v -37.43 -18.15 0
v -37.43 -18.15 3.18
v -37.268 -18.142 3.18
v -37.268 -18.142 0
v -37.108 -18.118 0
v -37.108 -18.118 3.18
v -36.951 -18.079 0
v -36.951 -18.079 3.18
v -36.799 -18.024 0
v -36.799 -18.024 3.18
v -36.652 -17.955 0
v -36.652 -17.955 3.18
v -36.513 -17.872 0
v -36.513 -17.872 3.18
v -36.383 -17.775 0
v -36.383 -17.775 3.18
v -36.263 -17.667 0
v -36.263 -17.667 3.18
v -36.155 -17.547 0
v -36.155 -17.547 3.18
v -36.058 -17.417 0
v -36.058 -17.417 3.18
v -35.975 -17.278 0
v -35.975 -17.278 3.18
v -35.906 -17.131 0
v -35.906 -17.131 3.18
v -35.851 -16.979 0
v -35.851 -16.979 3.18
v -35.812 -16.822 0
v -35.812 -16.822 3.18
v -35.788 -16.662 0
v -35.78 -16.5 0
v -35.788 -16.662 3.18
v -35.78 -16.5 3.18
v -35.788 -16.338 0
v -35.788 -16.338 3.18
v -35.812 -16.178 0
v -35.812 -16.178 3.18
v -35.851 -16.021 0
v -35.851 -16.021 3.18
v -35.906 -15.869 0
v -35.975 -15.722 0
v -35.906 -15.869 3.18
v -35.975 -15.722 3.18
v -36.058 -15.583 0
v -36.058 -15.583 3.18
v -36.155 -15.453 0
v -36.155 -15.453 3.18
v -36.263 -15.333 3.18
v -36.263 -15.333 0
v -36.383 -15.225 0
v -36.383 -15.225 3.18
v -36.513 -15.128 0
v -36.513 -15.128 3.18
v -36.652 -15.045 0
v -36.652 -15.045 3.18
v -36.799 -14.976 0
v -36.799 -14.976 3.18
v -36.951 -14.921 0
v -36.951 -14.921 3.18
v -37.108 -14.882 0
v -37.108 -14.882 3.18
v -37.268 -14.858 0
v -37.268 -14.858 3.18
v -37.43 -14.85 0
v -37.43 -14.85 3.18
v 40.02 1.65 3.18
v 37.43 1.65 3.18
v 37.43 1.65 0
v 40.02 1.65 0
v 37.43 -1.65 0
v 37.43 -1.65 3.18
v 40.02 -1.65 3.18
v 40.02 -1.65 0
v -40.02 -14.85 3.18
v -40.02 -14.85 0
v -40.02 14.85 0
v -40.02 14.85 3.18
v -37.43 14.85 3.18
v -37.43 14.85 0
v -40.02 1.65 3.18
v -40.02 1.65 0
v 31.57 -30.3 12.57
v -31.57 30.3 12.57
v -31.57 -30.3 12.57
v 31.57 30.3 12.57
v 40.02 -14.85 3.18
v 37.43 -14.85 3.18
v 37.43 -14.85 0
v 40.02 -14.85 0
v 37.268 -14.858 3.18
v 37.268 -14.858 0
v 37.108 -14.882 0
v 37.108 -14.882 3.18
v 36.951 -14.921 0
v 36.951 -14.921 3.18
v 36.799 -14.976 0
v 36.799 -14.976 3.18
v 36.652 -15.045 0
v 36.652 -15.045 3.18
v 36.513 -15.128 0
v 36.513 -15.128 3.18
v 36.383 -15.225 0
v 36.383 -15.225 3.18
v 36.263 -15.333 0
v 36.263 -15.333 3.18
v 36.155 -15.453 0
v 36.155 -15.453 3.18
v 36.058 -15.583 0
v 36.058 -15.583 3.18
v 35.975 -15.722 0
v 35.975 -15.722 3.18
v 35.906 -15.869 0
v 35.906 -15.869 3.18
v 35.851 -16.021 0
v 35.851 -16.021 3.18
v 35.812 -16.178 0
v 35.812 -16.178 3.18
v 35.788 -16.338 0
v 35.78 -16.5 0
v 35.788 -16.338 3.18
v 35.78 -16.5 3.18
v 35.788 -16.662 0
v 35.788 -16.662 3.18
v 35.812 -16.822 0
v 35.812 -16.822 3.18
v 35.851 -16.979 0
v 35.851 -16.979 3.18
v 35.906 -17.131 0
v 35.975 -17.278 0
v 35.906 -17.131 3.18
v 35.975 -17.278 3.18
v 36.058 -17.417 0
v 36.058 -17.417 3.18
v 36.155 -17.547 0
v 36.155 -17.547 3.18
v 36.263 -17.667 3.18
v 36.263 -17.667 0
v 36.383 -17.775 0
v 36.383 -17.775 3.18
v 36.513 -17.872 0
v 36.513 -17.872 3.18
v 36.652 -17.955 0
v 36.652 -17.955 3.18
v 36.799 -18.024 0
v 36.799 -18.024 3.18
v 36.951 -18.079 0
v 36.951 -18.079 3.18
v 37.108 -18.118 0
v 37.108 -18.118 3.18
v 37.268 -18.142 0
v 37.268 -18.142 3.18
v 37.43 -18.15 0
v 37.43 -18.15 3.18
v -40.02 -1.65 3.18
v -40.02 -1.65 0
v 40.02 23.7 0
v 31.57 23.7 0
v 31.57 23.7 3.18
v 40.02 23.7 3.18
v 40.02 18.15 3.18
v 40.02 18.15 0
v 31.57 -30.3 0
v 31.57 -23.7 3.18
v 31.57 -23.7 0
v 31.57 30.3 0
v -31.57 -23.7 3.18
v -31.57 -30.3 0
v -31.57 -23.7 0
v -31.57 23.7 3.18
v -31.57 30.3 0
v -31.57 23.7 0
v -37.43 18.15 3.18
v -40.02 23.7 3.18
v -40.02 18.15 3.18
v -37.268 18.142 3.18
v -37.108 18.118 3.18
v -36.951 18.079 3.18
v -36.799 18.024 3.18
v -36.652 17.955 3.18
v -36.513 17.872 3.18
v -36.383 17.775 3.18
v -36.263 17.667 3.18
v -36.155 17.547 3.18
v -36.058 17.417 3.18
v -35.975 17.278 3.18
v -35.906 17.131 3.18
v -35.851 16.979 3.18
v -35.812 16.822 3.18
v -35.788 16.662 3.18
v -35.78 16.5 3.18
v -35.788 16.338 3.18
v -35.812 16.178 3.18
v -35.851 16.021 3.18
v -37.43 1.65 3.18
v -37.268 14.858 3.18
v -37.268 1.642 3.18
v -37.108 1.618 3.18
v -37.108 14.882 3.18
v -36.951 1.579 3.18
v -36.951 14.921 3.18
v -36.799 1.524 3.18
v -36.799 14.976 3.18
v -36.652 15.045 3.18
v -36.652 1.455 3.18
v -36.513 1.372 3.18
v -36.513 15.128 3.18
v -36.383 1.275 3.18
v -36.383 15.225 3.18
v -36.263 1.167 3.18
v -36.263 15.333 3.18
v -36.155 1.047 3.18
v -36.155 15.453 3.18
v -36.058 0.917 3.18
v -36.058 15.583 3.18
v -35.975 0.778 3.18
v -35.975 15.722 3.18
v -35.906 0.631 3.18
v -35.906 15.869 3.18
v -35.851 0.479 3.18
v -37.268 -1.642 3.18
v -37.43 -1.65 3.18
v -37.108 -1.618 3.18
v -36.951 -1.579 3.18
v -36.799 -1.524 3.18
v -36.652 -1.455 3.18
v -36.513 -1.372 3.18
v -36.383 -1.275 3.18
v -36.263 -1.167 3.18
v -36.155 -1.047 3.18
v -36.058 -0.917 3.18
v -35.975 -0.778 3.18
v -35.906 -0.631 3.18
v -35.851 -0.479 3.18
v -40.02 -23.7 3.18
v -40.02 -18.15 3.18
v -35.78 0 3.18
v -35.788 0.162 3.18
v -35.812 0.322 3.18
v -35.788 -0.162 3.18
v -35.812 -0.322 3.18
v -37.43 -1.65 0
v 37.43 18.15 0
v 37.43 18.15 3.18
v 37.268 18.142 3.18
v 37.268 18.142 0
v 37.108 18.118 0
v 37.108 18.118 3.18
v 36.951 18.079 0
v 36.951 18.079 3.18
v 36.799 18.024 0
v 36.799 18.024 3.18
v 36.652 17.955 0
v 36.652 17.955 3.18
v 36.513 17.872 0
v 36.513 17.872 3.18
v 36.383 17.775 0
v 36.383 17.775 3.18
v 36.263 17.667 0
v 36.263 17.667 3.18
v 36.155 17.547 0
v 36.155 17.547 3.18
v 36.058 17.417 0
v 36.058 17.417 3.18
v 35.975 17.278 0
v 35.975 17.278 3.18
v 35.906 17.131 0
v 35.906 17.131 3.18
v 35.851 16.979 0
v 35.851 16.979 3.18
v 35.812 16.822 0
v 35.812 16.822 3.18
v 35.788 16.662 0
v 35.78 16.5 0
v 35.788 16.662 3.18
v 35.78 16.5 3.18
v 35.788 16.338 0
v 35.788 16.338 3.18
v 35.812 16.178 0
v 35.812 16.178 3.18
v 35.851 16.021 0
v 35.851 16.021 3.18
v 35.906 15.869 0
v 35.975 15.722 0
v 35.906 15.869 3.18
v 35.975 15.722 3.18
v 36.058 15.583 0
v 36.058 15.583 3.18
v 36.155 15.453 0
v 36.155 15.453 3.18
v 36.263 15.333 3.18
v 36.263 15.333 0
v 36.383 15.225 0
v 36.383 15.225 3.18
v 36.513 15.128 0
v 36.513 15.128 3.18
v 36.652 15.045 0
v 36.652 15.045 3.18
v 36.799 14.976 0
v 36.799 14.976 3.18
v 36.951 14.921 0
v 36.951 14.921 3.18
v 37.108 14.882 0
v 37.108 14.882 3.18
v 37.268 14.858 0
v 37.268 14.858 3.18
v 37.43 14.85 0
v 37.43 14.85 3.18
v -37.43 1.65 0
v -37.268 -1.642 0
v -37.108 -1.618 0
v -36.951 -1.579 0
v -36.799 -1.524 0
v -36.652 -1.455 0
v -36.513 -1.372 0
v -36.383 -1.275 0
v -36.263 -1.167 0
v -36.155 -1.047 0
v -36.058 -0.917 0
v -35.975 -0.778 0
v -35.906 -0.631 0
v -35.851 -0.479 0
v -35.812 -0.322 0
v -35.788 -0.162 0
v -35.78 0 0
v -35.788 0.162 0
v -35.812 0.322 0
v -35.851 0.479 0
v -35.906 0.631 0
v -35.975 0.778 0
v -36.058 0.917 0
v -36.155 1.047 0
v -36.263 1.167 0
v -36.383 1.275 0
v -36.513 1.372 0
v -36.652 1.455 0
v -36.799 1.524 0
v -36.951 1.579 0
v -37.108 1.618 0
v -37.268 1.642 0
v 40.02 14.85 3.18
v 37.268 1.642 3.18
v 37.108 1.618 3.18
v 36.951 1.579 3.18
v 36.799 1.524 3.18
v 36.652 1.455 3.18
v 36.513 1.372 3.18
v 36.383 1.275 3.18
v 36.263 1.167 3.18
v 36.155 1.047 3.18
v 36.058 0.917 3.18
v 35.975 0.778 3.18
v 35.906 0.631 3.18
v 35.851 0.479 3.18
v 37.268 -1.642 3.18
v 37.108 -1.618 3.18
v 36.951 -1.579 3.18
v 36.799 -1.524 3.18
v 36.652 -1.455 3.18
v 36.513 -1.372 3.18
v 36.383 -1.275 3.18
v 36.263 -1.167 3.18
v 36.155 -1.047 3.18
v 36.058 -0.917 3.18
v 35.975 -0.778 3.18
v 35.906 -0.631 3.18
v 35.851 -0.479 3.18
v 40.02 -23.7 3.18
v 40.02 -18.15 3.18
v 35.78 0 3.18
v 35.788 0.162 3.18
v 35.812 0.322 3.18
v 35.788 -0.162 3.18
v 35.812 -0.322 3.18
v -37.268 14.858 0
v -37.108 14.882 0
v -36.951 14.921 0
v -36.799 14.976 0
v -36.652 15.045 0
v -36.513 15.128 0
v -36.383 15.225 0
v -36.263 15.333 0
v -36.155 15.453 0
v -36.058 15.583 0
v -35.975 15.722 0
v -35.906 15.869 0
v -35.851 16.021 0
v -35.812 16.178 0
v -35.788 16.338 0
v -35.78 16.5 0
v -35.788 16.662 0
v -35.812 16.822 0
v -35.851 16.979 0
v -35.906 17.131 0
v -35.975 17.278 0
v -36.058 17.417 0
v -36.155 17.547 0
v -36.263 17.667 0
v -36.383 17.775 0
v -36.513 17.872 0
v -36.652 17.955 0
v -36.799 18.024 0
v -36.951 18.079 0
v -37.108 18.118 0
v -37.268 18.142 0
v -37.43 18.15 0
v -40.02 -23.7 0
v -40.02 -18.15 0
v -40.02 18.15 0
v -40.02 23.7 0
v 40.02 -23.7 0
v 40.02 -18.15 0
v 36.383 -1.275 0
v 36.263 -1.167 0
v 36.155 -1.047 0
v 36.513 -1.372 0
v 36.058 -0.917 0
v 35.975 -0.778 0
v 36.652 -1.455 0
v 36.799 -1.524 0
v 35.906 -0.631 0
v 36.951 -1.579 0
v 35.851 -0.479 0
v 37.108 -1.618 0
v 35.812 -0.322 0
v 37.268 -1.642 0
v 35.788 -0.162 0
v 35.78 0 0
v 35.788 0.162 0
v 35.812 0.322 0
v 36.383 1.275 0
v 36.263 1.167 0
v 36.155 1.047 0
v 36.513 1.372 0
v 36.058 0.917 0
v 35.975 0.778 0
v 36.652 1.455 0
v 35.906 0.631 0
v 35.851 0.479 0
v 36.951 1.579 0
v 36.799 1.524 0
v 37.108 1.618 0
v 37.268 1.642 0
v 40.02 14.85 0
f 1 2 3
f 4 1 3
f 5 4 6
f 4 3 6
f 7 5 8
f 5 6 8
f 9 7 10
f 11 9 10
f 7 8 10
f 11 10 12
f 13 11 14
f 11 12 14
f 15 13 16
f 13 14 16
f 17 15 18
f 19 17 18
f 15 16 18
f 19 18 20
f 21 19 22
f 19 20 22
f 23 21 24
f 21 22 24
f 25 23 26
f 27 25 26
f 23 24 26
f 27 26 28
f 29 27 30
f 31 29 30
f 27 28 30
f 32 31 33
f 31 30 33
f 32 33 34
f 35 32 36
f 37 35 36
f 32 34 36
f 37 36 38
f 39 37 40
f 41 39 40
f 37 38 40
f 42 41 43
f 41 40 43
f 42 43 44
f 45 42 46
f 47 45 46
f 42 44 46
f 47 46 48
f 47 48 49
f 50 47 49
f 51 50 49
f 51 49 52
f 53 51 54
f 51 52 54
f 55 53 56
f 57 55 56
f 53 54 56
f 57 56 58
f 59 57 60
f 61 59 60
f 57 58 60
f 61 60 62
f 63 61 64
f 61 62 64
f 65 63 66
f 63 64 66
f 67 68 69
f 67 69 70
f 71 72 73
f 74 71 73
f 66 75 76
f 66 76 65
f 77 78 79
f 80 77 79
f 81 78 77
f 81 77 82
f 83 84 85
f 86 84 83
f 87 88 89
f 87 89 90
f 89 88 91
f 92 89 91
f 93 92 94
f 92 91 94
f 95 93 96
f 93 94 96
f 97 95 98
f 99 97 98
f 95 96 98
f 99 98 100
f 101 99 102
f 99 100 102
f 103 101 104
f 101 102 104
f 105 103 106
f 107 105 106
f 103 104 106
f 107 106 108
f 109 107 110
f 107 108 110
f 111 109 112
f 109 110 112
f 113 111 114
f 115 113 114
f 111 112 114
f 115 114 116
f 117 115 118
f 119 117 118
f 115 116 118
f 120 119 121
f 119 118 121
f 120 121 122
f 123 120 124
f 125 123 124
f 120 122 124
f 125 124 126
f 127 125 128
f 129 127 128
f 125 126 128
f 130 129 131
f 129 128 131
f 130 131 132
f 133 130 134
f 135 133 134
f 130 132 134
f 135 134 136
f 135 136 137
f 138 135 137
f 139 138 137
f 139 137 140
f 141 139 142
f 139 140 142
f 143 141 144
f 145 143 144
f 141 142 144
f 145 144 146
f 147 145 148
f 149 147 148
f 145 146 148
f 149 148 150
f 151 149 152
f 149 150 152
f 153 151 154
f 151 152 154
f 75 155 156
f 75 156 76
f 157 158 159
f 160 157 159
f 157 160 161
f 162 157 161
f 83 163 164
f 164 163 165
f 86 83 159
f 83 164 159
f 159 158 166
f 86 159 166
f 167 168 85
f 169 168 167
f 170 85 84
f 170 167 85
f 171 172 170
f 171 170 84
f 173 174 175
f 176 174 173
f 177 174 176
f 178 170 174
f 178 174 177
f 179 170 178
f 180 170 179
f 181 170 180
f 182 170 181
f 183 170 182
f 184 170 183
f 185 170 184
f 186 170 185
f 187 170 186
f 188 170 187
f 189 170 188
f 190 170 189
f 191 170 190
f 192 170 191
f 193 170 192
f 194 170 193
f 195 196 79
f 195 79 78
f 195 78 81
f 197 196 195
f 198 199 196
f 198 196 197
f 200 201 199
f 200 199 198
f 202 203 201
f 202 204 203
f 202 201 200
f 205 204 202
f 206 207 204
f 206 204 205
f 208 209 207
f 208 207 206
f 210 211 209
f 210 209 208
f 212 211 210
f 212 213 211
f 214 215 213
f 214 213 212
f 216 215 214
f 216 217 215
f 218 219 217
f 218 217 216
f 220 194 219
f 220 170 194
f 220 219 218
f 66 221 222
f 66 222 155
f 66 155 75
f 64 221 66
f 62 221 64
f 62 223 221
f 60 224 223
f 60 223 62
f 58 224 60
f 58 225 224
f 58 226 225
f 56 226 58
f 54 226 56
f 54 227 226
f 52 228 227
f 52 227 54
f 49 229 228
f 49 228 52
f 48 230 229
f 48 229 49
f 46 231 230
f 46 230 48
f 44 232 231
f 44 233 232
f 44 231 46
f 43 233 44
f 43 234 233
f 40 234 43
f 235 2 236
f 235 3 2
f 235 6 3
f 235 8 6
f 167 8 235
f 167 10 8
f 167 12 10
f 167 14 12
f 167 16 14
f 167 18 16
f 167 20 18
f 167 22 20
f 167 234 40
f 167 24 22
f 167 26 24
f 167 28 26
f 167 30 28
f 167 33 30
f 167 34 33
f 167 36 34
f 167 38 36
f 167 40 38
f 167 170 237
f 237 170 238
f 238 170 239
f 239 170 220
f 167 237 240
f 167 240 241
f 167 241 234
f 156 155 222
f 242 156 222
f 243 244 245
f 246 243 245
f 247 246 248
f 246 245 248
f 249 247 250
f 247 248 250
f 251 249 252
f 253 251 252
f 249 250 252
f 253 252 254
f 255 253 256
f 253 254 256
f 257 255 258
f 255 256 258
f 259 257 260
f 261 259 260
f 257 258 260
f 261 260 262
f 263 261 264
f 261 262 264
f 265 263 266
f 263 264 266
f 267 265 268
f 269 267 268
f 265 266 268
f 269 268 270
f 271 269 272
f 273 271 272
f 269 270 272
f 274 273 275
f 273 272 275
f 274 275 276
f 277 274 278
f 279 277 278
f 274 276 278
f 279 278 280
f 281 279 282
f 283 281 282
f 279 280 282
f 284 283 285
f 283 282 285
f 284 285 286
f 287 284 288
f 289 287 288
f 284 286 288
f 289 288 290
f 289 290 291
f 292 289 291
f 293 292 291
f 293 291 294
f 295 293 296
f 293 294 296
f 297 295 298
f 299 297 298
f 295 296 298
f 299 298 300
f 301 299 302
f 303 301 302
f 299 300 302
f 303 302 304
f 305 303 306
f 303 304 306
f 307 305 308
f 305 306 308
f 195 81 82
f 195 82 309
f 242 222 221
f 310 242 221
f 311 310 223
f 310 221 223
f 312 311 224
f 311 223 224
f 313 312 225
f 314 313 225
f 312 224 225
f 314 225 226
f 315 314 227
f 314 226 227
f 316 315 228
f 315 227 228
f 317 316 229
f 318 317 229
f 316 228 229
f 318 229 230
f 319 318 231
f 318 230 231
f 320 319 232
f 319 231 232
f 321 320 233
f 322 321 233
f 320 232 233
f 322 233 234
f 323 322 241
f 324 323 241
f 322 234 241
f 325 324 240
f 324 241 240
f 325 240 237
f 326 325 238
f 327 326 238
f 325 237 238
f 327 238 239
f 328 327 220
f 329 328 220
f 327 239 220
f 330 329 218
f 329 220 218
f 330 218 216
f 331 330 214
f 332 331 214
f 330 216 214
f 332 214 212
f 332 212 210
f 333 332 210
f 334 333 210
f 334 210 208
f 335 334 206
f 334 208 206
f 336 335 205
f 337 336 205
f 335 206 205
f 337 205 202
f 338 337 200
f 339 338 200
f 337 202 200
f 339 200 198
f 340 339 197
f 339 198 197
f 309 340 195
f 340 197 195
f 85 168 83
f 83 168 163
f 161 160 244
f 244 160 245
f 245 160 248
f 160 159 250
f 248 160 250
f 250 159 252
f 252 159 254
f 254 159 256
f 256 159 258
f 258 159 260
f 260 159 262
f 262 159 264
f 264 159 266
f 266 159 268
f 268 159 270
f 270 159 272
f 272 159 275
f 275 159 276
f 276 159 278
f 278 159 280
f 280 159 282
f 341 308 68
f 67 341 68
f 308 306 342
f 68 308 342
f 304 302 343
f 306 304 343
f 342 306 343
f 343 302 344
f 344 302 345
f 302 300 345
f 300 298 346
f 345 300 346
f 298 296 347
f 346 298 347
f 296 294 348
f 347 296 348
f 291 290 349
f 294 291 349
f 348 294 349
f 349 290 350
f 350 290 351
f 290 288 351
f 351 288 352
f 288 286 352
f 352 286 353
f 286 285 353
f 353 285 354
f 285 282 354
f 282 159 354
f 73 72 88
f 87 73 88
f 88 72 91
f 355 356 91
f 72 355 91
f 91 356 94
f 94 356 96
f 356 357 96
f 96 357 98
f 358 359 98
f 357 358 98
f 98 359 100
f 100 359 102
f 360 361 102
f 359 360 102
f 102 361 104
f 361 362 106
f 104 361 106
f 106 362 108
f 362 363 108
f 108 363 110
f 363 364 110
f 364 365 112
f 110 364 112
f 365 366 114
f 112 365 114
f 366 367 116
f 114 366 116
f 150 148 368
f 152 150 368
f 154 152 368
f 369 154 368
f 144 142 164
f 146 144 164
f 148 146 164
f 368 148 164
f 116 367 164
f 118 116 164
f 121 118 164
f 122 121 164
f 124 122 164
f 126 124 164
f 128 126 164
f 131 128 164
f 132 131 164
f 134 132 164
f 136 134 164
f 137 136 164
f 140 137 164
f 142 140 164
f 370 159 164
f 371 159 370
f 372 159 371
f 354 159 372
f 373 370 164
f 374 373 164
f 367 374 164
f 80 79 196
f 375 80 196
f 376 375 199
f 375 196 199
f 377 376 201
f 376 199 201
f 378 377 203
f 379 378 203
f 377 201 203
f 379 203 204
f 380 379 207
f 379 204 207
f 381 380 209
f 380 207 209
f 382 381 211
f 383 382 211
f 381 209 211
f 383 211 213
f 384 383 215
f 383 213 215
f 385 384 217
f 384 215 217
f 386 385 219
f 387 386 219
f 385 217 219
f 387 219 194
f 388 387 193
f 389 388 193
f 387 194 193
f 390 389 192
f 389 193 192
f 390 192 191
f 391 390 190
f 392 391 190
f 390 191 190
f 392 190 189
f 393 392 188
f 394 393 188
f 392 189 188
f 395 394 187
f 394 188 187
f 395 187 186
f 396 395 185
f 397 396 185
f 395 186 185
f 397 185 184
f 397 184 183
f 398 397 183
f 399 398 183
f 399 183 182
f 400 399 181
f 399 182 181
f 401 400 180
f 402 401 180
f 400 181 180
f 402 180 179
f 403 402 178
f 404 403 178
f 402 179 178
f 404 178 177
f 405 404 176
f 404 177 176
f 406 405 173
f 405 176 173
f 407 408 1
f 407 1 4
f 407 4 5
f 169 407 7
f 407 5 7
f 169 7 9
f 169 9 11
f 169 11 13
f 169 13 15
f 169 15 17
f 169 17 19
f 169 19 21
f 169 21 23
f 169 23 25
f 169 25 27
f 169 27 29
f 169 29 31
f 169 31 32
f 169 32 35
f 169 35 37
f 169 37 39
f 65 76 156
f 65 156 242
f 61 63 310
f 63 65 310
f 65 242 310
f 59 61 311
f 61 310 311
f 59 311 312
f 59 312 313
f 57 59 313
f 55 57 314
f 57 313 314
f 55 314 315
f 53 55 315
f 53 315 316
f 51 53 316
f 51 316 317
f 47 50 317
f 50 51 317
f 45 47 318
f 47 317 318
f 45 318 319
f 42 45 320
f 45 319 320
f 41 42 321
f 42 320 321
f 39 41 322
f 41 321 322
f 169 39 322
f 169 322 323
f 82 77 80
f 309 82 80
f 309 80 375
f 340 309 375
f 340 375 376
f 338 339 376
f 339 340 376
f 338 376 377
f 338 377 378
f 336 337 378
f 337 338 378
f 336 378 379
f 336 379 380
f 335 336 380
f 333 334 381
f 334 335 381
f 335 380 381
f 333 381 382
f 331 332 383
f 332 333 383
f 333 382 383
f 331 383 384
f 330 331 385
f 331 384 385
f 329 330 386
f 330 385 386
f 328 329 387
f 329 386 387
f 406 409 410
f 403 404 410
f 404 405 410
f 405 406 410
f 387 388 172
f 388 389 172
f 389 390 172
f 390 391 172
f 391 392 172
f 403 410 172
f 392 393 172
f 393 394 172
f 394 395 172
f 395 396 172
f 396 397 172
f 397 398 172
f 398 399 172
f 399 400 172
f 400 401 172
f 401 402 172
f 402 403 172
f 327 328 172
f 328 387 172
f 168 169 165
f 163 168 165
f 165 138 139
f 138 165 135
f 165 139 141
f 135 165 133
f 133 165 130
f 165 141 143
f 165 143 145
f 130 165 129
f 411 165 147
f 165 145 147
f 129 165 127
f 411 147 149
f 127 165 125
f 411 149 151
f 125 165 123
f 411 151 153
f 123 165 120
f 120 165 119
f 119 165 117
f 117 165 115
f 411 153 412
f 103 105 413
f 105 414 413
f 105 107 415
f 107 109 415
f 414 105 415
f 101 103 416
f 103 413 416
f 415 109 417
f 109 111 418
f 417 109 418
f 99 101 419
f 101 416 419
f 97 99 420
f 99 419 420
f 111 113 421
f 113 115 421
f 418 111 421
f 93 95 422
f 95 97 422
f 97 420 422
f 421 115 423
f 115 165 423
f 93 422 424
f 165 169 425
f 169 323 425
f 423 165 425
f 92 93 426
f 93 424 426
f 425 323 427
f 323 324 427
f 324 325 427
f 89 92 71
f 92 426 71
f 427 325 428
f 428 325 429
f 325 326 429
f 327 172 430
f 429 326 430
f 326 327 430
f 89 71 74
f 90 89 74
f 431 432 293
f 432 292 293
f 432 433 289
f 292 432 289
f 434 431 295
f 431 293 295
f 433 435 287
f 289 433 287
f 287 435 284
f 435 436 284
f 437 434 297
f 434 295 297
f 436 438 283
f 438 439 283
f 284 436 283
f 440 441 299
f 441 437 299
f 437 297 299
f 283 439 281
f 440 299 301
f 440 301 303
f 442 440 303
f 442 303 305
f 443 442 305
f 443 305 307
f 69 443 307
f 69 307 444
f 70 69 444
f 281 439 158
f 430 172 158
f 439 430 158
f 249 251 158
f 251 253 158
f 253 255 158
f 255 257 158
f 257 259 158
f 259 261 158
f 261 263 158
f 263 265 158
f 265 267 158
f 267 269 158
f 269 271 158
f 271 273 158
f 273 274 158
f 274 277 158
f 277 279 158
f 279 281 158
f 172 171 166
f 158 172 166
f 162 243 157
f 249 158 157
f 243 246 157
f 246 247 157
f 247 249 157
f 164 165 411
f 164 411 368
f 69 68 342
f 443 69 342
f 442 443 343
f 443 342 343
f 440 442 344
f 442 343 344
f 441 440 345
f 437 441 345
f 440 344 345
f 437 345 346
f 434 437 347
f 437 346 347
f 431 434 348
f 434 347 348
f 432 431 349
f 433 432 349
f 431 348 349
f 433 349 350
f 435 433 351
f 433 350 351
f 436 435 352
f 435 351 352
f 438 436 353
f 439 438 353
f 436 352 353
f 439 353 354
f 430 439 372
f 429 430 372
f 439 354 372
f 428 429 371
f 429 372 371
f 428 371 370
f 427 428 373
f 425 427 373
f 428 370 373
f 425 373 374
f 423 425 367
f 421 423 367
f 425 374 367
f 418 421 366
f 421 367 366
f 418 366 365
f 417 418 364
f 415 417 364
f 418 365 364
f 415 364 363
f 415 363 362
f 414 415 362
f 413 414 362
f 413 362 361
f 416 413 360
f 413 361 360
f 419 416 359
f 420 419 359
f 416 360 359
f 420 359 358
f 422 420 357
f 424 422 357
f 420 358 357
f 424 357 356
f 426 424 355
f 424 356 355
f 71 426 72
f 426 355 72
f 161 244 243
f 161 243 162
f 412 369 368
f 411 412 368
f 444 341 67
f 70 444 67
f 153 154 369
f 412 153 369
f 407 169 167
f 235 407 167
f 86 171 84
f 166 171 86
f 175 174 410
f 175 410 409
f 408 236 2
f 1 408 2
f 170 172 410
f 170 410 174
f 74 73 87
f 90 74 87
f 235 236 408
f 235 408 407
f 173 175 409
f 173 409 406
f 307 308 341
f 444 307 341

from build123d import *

# Parameters (mm, degrees)
F0_W     = 63.14
F0_H     = 60.6
F1_DEPTH = 12.57
F2_W     = 47.4
F2_H     = 3.18
F3_DEPTH = 8.45
F5_W     = 2.59
F5_H     = 3.3
F6_DEPTH = 3.18


# Not quite as in the source:
# - a feature names something its author has since deleted; it is built from what else it names


with BuildPart() as f1:
    # F0 (on Top) → F1 (new body)
    with BuildSketch(Plane.XY):
        Rectangle(F0_W, F0_H)
    extrude(amount=F1_DEPTH)

    # F2 (on face) → F3 (join)
    with BuildSketch(Plane(origin=(-31.57, 0, 0), x_dir=(0, -1, 0), z_dir=(-1, 0, 0))):
        with Locations((0, 1.59)):
            Rectangle(F2_W, F2_H)
    extrude(amount=F3_DEPTH)

    # F4: F1 across plane


with BuildPart() as f1_1:
    add(f1.part)
    add(f1.part.mirror(Plane.YZ))

    # F5 (on face) → F6 (cut, through all)
    with BuildSketch(Plane.XY.offset(3.18)):
        with Locations((-38.725, 16.5)):
            Rectangle(F5_W, F5_H)
        with BuildLine():
            Line((-37.43, 18.15), (-37.43, 14.85))
            ThreePointArc((-37.43, 14.85), (-35.78, 16.5), (-37.43, 18.15))
        make_face()
        with Locations((-38.725, 0)):
            Rectangle(F5_W, F5_H)
        with BuildLine():
            ThreePointArc((-37.43, -1.65), (-35.78, 0), (-37.43, 1.65))
            Line((-37.43, 1.65), (-37.43, -1.65))
        make_face()
        with Locations((-38.725, -16.5)):
            Rectangle(F5_W, F5_H)
        with BuildLine():
            ThreePointArc((-37.43, -18.15), (-35.78, -16.5), (-37.43, -14.85))
            Line((-37.43, -14.85), (-37.43, -18.15))
        make_face()
        with BuildLine():
            Line((37.43, 14.85), (37.43, 18.15))
            ThreePointArc((37.43, 18.15), (35.78, 16.5), (37.43, 14.85))
        make_face()
        with Locations((38.725, 16.5)):
            Rectangle(F5_W, F5_H)
        with BuildLine():
            ThreePointArc((37.43, 1.65), (35.78, 0), (37.43, -1.65))
            Line((37.43, -1.65), (37.43, 1.65))
        make_face()
        with Locations((38.725, 0)):
            Rectangle(F5_W, F5_H)
        with BuildLine():
            ThreePointArc((37.43, -14.85), (35.78, -16.5), (37.43, -18.15))
            Line((37.43, -18.15), (37.43, -14.85))
        make_face()
        with Locations((38.725, -16.5)):
            Rectangle(F5_W, F5_H)
    extrude(amount=-F6_DEPTH, mode=Mode.SUBTRACT)


solid = f1_1.part
